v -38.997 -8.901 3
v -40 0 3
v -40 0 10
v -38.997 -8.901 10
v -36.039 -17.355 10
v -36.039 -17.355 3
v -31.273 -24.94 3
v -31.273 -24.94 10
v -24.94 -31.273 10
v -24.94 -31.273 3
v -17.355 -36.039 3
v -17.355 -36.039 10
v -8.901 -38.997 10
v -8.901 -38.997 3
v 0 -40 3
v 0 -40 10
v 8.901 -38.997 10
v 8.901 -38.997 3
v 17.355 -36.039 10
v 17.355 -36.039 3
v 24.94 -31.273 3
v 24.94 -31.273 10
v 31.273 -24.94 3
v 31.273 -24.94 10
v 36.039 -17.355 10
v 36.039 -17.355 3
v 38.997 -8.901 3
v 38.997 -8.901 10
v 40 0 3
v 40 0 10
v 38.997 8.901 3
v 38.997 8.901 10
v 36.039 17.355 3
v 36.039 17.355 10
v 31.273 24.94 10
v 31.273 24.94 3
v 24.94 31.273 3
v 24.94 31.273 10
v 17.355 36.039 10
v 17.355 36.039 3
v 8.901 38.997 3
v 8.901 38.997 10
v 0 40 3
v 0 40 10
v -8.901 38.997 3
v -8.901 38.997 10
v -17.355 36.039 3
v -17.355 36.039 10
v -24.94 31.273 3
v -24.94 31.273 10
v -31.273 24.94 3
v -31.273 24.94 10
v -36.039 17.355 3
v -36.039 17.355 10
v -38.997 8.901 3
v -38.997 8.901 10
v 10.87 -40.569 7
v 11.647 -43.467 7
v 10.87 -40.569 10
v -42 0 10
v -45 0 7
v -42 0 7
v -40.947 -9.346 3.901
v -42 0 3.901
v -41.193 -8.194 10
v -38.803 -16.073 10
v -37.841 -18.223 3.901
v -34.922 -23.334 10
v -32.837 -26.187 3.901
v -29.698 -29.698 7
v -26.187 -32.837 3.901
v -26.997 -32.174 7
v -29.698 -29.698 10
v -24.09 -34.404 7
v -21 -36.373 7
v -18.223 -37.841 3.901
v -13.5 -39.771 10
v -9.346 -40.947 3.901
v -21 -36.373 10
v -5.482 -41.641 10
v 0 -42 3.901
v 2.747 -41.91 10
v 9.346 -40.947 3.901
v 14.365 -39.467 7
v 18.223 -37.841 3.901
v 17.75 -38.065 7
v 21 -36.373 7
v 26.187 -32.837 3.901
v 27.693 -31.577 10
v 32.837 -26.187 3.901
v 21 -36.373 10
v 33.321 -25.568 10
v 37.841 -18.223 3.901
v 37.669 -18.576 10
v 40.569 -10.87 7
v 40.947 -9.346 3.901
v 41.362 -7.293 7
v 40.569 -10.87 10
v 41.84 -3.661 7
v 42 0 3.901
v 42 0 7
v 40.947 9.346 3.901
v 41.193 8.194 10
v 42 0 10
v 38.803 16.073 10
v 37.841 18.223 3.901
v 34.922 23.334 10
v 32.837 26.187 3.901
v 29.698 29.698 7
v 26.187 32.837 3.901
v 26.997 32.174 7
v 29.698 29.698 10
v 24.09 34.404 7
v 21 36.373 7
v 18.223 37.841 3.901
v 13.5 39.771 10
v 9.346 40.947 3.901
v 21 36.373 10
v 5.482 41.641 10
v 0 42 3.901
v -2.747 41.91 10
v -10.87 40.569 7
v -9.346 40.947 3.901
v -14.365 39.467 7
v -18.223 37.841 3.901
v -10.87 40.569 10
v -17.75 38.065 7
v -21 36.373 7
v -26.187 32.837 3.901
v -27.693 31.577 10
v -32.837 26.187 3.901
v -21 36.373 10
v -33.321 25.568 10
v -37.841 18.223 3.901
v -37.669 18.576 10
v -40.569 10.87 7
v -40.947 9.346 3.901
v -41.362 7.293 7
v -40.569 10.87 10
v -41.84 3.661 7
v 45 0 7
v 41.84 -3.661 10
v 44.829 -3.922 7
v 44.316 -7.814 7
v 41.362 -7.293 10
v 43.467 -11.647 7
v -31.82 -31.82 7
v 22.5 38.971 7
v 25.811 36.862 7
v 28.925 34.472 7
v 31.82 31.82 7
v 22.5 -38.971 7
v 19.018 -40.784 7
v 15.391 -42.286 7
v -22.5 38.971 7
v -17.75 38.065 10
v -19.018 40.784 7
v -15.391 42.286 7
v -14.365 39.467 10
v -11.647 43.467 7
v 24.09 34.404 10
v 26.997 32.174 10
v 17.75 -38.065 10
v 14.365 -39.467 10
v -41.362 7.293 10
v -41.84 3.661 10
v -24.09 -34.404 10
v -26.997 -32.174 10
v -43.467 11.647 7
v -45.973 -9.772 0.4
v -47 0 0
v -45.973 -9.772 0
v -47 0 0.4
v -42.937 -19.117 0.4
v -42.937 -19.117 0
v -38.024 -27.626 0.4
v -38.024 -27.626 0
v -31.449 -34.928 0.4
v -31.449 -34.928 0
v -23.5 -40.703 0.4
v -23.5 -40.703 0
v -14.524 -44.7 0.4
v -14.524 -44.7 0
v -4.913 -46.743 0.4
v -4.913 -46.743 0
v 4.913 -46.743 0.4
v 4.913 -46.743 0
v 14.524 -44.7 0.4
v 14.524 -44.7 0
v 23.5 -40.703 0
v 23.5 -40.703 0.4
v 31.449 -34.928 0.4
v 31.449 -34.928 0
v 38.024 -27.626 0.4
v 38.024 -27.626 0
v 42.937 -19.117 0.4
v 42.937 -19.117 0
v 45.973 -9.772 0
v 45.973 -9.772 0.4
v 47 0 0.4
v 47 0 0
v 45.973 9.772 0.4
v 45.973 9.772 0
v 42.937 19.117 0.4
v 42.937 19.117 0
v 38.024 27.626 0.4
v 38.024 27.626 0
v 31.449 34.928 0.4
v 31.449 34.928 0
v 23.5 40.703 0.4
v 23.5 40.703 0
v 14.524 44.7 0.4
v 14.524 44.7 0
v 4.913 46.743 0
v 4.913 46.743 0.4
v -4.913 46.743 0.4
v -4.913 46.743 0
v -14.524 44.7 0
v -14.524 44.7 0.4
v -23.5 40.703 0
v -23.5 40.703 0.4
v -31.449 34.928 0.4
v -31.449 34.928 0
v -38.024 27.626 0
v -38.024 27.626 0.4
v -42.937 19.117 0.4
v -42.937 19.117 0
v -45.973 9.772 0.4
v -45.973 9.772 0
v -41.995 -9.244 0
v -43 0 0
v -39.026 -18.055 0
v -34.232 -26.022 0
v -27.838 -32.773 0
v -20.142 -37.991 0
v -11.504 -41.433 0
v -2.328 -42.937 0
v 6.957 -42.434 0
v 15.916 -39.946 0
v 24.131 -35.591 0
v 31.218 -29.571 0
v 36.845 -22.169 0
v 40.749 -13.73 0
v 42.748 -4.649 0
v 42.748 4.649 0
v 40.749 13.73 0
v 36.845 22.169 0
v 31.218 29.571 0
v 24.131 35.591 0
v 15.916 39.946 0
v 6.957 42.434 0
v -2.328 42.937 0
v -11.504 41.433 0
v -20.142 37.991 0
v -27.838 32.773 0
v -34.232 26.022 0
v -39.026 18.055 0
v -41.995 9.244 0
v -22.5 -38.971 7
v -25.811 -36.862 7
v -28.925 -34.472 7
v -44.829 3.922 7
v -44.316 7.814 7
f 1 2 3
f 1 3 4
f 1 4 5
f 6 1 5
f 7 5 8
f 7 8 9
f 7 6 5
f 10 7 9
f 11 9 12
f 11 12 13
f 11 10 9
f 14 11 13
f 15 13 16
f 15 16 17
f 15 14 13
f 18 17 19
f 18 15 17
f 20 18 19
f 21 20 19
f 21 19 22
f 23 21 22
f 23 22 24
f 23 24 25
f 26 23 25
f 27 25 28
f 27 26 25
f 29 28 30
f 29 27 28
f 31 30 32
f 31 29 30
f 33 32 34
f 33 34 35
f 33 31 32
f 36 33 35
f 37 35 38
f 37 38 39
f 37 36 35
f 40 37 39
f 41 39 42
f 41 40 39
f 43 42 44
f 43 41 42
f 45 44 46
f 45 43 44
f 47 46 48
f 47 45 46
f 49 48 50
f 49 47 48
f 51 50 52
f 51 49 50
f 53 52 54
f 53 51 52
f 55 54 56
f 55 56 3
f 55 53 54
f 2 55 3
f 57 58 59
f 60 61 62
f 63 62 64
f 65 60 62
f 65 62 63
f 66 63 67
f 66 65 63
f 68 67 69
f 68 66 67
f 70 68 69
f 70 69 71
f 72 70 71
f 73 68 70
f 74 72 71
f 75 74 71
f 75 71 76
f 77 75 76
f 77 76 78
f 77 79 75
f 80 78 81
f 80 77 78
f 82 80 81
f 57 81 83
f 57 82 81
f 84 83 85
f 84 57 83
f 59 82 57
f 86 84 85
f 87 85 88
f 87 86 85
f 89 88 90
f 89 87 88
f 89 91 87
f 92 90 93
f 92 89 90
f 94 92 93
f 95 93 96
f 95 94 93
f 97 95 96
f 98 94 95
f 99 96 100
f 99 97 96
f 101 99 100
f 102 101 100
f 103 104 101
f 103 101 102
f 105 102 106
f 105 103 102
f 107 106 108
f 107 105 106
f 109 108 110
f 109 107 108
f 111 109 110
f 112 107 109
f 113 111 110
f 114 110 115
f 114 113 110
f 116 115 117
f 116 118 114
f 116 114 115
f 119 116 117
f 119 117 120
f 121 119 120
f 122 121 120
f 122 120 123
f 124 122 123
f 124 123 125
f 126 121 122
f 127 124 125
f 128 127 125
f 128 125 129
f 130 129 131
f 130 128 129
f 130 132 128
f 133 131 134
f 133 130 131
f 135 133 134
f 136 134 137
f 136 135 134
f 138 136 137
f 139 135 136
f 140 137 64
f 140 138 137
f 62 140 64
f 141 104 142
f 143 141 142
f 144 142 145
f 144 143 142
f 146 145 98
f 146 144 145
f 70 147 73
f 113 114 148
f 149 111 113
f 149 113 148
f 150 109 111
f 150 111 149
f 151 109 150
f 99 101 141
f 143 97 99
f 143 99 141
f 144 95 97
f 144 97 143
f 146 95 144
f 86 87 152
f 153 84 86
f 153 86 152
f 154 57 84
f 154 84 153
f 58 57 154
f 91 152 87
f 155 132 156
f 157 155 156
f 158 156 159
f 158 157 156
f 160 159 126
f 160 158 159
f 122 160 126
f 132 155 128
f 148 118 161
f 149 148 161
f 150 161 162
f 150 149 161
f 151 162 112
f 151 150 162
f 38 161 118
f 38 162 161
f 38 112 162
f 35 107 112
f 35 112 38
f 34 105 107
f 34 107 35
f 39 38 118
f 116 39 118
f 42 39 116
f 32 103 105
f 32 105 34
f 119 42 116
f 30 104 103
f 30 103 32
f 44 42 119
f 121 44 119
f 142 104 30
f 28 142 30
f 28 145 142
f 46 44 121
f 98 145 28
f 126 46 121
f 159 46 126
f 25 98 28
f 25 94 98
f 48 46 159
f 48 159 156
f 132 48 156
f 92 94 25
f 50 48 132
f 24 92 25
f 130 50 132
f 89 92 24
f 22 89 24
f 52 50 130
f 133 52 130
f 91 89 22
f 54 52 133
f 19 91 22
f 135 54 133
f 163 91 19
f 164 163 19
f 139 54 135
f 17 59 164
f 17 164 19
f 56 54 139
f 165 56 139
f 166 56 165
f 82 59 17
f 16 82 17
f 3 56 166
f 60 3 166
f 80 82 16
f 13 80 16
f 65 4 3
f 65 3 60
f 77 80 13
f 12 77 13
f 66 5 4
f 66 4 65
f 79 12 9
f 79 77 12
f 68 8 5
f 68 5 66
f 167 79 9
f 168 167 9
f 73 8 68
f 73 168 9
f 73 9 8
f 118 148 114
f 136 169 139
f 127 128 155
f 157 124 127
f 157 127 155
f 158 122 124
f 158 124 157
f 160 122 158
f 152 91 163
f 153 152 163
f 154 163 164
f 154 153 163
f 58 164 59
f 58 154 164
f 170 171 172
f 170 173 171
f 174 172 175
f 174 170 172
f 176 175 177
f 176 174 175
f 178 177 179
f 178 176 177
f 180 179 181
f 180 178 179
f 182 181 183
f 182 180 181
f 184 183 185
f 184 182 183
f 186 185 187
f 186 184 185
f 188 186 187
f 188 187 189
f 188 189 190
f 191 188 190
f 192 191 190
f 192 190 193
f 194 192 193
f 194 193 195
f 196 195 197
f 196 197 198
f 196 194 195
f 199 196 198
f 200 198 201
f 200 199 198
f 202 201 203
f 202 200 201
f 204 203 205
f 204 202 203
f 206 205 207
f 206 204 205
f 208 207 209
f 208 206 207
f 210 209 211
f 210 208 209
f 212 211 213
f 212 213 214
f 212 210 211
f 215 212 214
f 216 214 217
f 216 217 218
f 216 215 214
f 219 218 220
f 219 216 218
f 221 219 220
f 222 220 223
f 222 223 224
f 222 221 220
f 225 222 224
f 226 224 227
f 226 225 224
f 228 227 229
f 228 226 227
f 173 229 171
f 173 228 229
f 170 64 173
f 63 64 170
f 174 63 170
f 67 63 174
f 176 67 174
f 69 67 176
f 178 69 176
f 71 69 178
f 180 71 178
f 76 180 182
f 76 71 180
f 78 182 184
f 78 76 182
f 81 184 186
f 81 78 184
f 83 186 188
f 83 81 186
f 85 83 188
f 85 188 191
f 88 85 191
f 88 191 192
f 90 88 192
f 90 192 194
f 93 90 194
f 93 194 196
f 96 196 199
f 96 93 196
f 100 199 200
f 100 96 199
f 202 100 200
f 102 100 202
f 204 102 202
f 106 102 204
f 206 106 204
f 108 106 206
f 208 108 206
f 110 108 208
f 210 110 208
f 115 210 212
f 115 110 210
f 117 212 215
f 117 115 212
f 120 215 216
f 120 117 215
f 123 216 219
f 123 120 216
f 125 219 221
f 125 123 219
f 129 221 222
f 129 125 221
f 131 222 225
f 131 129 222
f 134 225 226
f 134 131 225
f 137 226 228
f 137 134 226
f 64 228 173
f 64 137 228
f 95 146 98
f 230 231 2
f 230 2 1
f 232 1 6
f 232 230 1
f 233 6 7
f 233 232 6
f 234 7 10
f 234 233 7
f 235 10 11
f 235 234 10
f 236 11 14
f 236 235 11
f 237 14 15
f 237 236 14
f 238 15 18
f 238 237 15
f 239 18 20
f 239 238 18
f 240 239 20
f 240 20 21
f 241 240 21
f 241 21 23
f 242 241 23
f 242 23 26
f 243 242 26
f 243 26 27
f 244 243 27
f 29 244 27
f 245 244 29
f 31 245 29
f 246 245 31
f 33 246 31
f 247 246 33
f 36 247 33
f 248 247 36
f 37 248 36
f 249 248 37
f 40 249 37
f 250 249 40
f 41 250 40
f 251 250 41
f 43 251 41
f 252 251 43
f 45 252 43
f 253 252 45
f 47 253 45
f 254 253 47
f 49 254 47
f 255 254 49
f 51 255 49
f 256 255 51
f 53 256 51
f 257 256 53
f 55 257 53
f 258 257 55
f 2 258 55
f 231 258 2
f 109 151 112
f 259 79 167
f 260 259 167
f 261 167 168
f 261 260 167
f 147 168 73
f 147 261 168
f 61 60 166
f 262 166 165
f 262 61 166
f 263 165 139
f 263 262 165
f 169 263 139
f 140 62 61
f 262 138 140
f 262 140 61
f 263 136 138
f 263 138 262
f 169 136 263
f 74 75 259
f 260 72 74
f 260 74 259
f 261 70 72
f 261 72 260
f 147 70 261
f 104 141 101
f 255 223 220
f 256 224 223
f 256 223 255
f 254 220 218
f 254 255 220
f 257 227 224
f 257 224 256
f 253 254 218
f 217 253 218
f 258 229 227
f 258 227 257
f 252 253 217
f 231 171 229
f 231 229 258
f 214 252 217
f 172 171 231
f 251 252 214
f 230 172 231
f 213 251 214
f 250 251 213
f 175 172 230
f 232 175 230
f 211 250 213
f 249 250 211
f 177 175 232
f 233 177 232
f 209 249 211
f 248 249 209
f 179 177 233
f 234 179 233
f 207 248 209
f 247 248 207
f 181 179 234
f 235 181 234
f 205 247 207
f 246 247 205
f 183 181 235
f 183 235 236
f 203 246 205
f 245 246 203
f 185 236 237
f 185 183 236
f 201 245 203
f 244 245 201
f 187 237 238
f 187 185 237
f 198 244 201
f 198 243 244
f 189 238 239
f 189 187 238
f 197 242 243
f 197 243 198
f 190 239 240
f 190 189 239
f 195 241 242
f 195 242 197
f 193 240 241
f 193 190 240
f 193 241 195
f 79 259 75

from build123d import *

# Parameters (mm, degrees)
REVOLUTION001_ANGLE = -15
POLARPATTERN_COUNT  = 6
CHAMFER_SIZE        = 3


with BuildPart() as part:
    # Sketch → Revolution (revolve)
    with BuildSketch(Plane.XZ):
        Polygon((-42, 10), (-40, 10), (-40, 0), (-47, 0), (-47, 0.4), (-42, 3.901038), align=None)
    revolve(axis=Axis((0, 0, 0), (0, 0, 1)))

    # Sketch001 → Revolution001 (revolve)
    with BuildSketch(Plane.XZ):
        Polygon((-45, 7), (-42, 7), (-42, 10), align=None)
    revolution001 = revolve(axis=Axis((0, 0, 0), (0, 0, 1)), revolution_arc=REVOLUTION001_ANGLE)

    # PolarPattern: Revolution001 ×6 about axis
    polarpattern_axis = Axis((0, 0, 0), (0, 0, 1))
    for i in range(1, POLARPATTERN_COUNT):
        add(revolution001.rotate(polarpattern_axis, i * 360 / POLARPATTERN_COUNT))

    # Chamfer
    chamfer_edges = [part.edges().sort_by_distance(p)[0] for p in [
        (40, 0, 0),
    ]]
    chamfer(chamfer_edges, length=CHAMFER_SIZE)


solid = part.part
